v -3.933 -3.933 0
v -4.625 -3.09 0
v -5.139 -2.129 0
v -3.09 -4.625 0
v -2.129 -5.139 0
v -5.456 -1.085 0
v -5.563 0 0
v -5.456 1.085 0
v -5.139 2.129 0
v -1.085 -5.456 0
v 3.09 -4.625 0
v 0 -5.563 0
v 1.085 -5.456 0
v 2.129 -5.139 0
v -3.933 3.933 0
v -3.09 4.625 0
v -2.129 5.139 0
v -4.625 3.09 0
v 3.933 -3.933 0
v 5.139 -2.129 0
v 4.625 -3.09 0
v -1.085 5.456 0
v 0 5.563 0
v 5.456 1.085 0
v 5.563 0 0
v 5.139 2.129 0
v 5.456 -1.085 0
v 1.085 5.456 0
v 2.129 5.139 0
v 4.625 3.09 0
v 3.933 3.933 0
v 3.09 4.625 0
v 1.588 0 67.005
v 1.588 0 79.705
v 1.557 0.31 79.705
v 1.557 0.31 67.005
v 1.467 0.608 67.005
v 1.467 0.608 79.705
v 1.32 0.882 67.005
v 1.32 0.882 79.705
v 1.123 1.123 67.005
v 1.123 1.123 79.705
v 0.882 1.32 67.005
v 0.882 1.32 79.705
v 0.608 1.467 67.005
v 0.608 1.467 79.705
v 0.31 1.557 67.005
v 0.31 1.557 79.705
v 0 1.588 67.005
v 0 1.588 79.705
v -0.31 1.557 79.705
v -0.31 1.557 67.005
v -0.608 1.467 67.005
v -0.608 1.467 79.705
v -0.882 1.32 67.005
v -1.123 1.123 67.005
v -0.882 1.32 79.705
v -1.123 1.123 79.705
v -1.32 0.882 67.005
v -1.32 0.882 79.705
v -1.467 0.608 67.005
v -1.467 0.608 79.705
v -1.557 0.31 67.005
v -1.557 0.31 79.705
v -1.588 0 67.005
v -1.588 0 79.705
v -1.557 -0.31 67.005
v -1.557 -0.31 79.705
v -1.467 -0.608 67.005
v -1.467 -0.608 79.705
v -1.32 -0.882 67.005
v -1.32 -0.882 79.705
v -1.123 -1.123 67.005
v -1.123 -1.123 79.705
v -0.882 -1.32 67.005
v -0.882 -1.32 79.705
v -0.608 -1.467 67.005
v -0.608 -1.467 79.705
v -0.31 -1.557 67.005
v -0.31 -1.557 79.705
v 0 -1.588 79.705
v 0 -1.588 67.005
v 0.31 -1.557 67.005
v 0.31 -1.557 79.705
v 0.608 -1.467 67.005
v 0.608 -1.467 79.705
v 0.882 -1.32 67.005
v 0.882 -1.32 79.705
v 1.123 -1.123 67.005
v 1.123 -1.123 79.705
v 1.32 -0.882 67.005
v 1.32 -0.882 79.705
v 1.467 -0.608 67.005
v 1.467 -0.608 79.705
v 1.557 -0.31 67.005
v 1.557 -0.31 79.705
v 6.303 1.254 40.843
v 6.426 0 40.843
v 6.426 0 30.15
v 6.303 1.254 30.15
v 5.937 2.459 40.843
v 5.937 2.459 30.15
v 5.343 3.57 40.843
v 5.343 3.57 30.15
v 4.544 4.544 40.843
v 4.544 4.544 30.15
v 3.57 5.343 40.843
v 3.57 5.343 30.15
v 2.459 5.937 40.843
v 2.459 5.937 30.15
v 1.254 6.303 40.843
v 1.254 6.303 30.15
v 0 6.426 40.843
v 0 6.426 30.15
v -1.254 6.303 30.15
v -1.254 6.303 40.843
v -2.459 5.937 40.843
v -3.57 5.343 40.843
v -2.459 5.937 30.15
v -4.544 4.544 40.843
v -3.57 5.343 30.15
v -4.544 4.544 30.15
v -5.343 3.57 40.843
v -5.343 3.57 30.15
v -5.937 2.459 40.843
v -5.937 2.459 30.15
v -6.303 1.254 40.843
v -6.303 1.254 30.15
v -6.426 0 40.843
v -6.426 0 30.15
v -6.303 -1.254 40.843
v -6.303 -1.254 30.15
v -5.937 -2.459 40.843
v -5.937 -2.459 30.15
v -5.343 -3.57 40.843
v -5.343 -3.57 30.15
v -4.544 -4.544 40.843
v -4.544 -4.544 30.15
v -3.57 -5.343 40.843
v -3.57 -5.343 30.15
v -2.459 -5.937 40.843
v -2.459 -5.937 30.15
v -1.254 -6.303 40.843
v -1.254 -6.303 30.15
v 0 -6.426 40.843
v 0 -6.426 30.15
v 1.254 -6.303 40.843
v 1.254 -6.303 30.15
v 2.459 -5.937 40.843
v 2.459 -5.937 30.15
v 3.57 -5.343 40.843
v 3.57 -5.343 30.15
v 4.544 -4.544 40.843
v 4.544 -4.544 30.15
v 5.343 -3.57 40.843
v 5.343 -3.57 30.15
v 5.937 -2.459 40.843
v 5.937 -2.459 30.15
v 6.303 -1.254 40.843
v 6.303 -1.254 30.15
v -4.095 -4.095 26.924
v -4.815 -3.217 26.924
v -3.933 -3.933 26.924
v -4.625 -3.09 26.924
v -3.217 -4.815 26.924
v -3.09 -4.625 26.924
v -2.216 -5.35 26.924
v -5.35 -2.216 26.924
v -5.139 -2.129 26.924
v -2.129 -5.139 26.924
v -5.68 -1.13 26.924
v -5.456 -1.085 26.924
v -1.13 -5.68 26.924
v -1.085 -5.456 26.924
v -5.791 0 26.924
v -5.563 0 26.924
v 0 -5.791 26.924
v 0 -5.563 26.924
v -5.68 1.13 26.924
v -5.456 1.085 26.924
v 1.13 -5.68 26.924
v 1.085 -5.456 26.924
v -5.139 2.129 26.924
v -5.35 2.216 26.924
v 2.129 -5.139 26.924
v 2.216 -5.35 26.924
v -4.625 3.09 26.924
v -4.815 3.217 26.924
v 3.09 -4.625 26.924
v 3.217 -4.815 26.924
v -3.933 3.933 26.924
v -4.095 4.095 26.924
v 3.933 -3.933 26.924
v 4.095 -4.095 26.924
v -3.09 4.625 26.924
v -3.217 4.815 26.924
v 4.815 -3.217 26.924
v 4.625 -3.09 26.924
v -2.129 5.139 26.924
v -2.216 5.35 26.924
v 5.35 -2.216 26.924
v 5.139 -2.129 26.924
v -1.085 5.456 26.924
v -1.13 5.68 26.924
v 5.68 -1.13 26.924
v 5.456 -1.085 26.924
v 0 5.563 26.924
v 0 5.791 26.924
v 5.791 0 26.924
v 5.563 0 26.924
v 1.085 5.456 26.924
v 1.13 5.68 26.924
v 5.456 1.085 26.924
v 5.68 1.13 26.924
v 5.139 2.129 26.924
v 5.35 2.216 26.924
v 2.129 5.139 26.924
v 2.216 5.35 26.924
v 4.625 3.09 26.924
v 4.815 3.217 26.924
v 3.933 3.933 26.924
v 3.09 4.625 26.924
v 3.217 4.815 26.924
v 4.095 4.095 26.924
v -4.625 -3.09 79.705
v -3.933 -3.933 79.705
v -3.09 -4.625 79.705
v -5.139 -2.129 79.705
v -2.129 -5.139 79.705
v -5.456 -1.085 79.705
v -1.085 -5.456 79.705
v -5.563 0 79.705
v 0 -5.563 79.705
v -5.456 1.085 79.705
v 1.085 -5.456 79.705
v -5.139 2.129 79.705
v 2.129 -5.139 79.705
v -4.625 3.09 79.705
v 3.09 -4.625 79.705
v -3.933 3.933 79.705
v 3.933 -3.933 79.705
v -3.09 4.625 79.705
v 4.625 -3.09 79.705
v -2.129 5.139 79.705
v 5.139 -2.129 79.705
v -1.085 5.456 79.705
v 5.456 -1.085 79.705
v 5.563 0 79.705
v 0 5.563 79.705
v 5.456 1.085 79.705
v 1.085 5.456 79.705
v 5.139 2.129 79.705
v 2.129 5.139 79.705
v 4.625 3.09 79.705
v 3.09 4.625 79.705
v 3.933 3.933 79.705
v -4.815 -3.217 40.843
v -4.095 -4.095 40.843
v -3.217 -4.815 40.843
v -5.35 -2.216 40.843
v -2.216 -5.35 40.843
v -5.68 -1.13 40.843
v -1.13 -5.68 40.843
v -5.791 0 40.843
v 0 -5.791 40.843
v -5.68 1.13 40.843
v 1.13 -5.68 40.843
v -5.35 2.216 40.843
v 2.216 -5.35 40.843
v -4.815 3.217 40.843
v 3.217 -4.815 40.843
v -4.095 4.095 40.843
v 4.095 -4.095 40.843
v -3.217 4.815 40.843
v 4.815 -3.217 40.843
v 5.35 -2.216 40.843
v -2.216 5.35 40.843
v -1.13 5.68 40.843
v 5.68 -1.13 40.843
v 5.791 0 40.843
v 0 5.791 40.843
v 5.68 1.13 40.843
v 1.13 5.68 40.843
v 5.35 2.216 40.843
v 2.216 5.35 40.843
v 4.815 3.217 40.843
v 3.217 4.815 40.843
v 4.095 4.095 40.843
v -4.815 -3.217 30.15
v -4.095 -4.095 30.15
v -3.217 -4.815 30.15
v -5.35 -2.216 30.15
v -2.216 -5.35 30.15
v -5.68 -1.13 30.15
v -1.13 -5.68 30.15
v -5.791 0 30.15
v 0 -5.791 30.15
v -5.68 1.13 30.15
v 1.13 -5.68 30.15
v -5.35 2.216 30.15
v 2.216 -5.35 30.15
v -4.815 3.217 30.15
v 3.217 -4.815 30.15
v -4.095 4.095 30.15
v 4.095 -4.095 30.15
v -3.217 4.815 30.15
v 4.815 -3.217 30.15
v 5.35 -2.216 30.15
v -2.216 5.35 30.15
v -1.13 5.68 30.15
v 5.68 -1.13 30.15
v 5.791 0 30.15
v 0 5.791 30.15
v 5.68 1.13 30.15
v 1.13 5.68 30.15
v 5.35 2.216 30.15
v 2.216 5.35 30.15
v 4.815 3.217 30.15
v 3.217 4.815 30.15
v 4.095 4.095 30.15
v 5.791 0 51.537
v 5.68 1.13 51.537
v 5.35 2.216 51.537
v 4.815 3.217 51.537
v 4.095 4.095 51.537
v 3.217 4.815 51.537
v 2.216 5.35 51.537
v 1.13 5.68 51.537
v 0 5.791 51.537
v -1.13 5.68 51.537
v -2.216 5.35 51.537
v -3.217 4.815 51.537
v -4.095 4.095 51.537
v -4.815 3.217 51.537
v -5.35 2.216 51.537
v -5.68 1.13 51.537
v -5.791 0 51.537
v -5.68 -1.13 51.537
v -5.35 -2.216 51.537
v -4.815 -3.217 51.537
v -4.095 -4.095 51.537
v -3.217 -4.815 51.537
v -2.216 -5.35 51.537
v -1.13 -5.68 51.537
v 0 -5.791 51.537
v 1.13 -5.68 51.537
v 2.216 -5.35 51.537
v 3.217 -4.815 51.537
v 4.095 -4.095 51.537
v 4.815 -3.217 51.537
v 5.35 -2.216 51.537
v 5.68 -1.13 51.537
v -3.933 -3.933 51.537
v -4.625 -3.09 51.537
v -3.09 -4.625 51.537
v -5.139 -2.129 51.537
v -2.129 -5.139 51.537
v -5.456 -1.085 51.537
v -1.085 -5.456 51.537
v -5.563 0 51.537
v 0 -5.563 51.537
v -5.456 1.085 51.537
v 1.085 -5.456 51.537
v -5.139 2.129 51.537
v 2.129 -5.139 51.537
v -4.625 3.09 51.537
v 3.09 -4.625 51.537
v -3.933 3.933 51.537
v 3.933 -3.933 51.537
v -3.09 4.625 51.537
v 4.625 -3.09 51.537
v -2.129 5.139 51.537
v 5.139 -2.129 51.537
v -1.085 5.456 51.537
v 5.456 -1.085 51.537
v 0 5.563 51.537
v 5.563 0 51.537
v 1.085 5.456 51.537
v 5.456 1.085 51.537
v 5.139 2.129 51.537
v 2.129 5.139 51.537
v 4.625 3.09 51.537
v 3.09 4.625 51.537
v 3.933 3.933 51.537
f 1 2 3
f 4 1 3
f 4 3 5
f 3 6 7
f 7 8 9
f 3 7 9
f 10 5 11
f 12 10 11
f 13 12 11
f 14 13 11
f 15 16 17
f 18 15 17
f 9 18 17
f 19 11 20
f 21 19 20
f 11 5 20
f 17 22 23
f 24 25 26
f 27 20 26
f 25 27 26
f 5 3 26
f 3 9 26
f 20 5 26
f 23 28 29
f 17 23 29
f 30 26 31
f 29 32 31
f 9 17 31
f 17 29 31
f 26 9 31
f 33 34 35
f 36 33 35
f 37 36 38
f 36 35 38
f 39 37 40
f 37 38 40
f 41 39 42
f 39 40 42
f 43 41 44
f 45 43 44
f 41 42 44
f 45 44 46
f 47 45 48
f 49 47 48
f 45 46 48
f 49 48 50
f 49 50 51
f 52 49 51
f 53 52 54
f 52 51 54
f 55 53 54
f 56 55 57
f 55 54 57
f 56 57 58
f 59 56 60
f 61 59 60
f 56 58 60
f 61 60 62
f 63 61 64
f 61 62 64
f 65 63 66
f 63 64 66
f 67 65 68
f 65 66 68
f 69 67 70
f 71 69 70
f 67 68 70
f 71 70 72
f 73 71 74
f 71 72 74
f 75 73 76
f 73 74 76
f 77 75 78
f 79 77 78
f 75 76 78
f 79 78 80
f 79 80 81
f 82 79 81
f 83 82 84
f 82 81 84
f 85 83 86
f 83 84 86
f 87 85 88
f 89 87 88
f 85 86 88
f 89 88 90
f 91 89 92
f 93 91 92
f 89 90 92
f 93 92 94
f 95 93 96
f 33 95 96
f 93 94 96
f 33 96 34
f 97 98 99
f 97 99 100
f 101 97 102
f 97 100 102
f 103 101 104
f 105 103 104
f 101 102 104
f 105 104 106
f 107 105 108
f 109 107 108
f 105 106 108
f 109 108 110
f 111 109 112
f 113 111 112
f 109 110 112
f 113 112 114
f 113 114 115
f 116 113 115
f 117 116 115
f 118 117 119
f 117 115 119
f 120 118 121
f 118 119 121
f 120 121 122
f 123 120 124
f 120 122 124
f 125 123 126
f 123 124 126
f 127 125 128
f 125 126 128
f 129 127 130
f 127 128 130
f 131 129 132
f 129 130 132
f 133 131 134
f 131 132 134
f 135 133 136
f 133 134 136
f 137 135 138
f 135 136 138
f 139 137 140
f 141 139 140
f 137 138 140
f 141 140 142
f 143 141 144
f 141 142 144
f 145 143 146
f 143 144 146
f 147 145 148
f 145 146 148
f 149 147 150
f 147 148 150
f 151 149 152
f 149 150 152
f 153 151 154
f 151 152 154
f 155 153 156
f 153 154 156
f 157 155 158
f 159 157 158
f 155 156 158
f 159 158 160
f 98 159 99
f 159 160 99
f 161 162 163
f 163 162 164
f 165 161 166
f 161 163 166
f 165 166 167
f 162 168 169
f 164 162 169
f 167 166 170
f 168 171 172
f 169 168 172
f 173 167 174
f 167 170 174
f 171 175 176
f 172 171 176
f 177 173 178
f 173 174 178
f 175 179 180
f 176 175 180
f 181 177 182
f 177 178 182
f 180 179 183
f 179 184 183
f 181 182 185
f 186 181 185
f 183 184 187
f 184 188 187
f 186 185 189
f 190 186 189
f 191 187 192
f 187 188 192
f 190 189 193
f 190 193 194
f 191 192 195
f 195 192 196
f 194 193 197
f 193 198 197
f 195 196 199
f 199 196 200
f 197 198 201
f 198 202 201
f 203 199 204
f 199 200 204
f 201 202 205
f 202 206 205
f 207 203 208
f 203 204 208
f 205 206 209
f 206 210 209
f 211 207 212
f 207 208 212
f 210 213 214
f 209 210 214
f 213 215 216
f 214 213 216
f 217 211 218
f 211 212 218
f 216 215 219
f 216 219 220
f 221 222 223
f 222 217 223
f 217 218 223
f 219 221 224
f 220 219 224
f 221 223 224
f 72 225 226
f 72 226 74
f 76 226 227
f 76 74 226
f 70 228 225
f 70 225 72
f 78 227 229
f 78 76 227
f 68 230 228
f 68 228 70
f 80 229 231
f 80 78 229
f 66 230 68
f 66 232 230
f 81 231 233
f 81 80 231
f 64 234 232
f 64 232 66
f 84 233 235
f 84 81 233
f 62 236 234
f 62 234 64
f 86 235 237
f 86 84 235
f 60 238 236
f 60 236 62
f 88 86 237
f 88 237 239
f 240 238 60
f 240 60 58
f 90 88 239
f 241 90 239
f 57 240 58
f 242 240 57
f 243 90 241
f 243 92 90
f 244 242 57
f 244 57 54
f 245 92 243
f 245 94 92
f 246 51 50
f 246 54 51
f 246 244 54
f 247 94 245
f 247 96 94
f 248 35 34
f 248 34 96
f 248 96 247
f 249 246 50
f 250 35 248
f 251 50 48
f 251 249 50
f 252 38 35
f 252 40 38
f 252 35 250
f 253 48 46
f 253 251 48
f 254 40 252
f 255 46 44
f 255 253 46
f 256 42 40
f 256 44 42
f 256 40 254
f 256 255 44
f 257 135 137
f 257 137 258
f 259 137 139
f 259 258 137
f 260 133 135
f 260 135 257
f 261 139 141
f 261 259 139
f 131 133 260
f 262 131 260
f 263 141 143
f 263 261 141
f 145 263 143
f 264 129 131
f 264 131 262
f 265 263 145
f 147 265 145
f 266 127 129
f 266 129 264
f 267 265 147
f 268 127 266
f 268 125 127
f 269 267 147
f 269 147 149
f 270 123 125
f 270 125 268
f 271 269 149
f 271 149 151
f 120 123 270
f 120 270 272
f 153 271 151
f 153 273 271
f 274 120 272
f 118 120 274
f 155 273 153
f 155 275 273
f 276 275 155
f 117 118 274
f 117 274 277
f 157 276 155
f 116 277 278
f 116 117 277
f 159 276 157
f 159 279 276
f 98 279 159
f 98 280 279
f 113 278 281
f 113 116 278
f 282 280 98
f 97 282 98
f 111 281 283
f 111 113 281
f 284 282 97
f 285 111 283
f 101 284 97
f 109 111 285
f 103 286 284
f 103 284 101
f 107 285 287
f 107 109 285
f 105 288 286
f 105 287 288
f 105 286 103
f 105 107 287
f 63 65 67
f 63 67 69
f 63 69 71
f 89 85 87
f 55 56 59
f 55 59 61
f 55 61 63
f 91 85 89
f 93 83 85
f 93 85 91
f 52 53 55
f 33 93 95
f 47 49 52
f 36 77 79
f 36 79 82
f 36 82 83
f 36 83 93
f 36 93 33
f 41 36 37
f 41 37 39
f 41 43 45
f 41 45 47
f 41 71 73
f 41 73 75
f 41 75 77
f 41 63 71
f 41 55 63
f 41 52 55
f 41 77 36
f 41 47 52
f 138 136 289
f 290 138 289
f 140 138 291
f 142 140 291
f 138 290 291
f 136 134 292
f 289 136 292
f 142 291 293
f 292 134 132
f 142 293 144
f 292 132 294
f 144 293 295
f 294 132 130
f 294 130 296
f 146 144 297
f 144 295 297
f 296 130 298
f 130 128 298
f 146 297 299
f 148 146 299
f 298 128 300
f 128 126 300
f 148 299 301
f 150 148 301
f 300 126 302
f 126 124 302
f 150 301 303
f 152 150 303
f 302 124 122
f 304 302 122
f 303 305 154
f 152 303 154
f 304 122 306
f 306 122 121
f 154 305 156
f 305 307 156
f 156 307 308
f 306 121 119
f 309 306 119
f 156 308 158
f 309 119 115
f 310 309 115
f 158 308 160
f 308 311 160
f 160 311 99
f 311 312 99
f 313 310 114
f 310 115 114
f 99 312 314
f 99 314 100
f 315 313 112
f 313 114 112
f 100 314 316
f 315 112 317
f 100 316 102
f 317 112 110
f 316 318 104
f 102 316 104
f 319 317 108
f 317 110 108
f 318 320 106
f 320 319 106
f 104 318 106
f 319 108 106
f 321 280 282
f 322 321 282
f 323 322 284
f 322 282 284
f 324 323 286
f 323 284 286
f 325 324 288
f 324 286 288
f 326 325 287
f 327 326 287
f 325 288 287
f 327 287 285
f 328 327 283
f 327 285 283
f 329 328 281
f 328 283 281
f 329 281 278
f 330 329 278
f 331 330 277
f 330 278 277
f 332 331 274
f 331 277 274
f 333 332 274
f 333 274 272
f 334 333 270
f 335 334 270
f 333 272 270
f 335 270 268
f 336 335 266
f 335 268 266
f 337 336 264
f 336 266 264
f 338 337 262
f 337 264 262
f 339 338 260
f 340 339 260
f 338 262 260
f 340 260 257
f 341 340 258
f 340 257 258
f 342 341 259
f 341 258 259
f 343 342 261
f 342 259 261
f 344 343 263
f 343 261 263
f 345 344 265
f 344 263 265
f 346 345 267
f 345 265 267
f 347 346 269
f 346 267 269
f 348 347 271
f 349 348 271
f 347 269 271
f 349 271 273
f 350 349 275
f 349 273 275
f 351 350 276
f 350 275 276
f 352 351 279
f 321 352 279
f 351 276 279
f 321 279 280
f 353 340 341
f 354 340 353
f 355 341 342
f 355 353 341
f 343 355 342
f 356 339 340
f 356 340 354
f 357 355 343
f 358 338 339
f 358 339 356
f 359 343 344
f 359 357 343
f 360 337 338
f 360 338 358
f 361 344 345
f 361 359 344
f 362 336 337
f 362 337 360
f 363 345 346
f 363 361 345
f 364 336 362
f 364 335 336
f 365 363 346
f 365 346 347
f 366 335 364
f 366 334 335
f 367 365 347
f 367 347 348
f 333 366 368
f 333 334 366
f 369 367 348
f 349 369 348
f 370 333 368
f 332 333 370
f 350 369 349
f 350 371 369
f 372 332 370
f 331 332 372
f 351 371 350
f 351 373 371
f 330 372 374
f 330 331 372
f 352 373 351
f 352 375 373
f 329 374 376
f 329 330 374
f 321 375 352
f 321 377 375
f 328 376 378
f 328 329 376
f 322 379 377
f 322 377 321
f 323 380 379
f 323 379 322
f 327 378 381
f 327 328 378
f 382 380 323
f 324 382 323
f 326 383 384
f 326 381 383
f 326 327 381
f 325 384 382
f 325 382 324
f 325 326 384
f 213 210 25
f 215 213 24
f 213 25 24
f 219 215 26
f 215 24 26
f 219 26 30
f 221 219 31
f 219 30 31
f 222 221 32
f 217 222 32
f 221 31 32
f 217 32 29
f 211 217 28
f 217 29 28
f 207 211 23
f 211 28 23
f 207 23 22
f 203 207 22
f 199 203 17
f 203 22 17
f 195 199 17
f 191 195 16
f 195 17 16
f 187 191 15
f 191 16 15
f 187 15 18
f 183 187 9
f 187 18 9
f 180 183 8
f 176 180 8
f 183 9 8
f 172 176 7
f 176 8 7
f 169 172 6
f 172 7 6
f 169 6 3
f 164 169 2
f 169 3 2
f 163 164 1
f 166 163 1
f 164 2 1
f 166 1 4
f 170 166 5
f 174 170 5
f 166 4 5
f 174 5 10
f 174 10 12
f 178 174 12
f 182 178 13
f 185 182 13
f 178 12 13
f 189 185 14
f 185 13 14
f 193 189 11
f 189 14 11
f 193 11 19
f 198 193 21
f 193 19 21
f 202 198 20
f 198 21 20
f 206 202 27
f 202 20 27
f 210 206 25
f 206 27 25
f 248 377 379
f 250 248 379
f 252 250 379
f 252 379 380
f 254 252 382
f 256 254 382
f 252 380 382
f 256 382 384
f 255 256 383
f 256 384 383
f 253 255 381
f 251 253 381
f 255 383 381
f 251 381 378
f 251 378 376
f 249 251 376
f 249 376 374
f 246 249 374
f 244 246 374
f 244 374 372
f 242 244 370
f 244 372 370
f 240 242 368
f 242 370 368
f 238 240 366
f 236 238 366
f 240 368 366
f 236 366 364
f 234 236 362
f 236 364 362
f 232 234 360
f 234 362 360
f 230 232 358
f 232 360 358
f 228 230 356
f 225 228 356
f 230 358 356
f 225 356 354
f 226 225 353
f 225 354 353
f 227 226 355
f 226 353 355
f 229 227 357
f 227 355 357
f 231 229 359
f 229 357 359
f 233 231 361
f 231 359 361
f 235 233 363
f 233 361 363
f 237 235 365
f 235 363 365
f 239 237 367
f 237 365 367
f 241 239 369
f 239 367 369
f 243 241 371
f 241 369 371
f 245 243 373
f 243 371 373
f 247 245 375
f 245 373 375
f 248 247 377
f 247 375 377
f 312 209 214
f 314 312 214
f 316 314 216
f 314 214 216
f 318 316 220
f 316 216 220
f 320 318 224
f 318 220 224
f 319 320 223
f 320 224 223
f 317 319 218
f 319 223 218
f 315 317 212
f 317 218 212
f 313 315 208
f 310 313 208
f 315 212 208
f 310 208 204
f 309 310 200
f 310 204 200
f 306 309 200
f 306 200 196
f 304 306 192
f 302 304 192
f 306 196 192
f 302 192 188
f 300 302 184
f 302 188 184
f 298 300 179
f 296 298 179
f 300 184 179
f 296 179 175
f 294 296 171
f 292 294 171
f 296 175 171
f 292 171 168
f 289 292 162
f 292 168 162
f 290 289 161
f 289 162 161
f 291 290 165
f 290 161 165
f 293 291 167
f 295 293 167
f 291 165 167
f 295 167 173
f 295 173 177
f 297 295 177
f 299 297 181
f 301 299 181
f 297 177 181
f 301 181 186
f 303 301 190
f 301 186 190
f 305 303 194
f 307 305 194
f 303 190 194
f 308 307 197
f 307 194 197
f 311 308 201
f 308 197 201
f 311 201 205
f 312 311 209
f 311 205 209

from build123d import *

# Parameters (mm, degrees)
F0_R      = 5.5626
F1_DEPTH  = 26.924
F2_R      = 5.7912
F2_R_2    = 5.5626
F3_DEPTH  = 3.2258
F4_DEPTH  = 3.2258
F6_R      = 6.4262
F6_R_2    = 5.7912
F7_DEPTH  = 10.6934
F8_DEPTH  = 10.6934
F10_R     = 5.7912
F11_DEPTH = 10.6934
F12_R     = 5.5626
F13_DEPTH = 28.1686
F14_R     = 1.5875
F16_DEPTH = 12.7


with BuildPart() as f1:
    # F0 (on Top) → F1 (new body)
    with BuildSketch(Plane.XY):
        Circle(F0_R)
    extrude(amount=F1_DEPTH)

    # F2 (on face) → F3 (join)
    with BuildSketch(Plane.XY.offset(26.924)):
        Circle(F2_R)
        Circle(F2_R_2, mode=Mode.SUBTRACT)
    extrude(amount=F3_DEPTH)

    # F4 (add): a face of the model
    f4_faces = [f1.faces().sort_by_distance(p)[0] for p in [
        (0, 0, 26.924),
    ]]
    extrude(f4_faces, amount=F4_DEPTH)

    # F5: union 

    # F6 (on face) → F7 (join)
    with BuildSketch(Plane.XY.offset(30.1498)):
        Circle(F6_R)
        Circle(F6_R_2, mode=Mode.SUBTRACT)
    extrude(amount=F7_DEPTH)

    # F8 (add): a face of the model
    f8_faces = [f1.faces().sort_by_distance(p)[0] for p in [
        (0, 0, 30.1498),
    ]]
    extrude(f8_faces, amount=F8_DEPTH)

    # F9: union 

    # F10 (on face) → F11 (join)
    with BuildSketch(Plane.XY.offset(40.8432)):
        Circle(F10_R)
    extrude(amount=F11_DEPTH)

    # F12 (on face) → F13 (join)
    with BuildSketch(Plane.XY.offset(51.5366)):
        Circle(F12_R)
    extrude(amount=F13_DEPTH)

    # F14 (on face) → F16 (cut)
    with BuildSketch(Plane.XY.offset(79.7052)):
        Circle(F14_R)
    extrude(amount=-F16_DEPTH, mode=Mode.SUBTRACT)


solid = f1.part
